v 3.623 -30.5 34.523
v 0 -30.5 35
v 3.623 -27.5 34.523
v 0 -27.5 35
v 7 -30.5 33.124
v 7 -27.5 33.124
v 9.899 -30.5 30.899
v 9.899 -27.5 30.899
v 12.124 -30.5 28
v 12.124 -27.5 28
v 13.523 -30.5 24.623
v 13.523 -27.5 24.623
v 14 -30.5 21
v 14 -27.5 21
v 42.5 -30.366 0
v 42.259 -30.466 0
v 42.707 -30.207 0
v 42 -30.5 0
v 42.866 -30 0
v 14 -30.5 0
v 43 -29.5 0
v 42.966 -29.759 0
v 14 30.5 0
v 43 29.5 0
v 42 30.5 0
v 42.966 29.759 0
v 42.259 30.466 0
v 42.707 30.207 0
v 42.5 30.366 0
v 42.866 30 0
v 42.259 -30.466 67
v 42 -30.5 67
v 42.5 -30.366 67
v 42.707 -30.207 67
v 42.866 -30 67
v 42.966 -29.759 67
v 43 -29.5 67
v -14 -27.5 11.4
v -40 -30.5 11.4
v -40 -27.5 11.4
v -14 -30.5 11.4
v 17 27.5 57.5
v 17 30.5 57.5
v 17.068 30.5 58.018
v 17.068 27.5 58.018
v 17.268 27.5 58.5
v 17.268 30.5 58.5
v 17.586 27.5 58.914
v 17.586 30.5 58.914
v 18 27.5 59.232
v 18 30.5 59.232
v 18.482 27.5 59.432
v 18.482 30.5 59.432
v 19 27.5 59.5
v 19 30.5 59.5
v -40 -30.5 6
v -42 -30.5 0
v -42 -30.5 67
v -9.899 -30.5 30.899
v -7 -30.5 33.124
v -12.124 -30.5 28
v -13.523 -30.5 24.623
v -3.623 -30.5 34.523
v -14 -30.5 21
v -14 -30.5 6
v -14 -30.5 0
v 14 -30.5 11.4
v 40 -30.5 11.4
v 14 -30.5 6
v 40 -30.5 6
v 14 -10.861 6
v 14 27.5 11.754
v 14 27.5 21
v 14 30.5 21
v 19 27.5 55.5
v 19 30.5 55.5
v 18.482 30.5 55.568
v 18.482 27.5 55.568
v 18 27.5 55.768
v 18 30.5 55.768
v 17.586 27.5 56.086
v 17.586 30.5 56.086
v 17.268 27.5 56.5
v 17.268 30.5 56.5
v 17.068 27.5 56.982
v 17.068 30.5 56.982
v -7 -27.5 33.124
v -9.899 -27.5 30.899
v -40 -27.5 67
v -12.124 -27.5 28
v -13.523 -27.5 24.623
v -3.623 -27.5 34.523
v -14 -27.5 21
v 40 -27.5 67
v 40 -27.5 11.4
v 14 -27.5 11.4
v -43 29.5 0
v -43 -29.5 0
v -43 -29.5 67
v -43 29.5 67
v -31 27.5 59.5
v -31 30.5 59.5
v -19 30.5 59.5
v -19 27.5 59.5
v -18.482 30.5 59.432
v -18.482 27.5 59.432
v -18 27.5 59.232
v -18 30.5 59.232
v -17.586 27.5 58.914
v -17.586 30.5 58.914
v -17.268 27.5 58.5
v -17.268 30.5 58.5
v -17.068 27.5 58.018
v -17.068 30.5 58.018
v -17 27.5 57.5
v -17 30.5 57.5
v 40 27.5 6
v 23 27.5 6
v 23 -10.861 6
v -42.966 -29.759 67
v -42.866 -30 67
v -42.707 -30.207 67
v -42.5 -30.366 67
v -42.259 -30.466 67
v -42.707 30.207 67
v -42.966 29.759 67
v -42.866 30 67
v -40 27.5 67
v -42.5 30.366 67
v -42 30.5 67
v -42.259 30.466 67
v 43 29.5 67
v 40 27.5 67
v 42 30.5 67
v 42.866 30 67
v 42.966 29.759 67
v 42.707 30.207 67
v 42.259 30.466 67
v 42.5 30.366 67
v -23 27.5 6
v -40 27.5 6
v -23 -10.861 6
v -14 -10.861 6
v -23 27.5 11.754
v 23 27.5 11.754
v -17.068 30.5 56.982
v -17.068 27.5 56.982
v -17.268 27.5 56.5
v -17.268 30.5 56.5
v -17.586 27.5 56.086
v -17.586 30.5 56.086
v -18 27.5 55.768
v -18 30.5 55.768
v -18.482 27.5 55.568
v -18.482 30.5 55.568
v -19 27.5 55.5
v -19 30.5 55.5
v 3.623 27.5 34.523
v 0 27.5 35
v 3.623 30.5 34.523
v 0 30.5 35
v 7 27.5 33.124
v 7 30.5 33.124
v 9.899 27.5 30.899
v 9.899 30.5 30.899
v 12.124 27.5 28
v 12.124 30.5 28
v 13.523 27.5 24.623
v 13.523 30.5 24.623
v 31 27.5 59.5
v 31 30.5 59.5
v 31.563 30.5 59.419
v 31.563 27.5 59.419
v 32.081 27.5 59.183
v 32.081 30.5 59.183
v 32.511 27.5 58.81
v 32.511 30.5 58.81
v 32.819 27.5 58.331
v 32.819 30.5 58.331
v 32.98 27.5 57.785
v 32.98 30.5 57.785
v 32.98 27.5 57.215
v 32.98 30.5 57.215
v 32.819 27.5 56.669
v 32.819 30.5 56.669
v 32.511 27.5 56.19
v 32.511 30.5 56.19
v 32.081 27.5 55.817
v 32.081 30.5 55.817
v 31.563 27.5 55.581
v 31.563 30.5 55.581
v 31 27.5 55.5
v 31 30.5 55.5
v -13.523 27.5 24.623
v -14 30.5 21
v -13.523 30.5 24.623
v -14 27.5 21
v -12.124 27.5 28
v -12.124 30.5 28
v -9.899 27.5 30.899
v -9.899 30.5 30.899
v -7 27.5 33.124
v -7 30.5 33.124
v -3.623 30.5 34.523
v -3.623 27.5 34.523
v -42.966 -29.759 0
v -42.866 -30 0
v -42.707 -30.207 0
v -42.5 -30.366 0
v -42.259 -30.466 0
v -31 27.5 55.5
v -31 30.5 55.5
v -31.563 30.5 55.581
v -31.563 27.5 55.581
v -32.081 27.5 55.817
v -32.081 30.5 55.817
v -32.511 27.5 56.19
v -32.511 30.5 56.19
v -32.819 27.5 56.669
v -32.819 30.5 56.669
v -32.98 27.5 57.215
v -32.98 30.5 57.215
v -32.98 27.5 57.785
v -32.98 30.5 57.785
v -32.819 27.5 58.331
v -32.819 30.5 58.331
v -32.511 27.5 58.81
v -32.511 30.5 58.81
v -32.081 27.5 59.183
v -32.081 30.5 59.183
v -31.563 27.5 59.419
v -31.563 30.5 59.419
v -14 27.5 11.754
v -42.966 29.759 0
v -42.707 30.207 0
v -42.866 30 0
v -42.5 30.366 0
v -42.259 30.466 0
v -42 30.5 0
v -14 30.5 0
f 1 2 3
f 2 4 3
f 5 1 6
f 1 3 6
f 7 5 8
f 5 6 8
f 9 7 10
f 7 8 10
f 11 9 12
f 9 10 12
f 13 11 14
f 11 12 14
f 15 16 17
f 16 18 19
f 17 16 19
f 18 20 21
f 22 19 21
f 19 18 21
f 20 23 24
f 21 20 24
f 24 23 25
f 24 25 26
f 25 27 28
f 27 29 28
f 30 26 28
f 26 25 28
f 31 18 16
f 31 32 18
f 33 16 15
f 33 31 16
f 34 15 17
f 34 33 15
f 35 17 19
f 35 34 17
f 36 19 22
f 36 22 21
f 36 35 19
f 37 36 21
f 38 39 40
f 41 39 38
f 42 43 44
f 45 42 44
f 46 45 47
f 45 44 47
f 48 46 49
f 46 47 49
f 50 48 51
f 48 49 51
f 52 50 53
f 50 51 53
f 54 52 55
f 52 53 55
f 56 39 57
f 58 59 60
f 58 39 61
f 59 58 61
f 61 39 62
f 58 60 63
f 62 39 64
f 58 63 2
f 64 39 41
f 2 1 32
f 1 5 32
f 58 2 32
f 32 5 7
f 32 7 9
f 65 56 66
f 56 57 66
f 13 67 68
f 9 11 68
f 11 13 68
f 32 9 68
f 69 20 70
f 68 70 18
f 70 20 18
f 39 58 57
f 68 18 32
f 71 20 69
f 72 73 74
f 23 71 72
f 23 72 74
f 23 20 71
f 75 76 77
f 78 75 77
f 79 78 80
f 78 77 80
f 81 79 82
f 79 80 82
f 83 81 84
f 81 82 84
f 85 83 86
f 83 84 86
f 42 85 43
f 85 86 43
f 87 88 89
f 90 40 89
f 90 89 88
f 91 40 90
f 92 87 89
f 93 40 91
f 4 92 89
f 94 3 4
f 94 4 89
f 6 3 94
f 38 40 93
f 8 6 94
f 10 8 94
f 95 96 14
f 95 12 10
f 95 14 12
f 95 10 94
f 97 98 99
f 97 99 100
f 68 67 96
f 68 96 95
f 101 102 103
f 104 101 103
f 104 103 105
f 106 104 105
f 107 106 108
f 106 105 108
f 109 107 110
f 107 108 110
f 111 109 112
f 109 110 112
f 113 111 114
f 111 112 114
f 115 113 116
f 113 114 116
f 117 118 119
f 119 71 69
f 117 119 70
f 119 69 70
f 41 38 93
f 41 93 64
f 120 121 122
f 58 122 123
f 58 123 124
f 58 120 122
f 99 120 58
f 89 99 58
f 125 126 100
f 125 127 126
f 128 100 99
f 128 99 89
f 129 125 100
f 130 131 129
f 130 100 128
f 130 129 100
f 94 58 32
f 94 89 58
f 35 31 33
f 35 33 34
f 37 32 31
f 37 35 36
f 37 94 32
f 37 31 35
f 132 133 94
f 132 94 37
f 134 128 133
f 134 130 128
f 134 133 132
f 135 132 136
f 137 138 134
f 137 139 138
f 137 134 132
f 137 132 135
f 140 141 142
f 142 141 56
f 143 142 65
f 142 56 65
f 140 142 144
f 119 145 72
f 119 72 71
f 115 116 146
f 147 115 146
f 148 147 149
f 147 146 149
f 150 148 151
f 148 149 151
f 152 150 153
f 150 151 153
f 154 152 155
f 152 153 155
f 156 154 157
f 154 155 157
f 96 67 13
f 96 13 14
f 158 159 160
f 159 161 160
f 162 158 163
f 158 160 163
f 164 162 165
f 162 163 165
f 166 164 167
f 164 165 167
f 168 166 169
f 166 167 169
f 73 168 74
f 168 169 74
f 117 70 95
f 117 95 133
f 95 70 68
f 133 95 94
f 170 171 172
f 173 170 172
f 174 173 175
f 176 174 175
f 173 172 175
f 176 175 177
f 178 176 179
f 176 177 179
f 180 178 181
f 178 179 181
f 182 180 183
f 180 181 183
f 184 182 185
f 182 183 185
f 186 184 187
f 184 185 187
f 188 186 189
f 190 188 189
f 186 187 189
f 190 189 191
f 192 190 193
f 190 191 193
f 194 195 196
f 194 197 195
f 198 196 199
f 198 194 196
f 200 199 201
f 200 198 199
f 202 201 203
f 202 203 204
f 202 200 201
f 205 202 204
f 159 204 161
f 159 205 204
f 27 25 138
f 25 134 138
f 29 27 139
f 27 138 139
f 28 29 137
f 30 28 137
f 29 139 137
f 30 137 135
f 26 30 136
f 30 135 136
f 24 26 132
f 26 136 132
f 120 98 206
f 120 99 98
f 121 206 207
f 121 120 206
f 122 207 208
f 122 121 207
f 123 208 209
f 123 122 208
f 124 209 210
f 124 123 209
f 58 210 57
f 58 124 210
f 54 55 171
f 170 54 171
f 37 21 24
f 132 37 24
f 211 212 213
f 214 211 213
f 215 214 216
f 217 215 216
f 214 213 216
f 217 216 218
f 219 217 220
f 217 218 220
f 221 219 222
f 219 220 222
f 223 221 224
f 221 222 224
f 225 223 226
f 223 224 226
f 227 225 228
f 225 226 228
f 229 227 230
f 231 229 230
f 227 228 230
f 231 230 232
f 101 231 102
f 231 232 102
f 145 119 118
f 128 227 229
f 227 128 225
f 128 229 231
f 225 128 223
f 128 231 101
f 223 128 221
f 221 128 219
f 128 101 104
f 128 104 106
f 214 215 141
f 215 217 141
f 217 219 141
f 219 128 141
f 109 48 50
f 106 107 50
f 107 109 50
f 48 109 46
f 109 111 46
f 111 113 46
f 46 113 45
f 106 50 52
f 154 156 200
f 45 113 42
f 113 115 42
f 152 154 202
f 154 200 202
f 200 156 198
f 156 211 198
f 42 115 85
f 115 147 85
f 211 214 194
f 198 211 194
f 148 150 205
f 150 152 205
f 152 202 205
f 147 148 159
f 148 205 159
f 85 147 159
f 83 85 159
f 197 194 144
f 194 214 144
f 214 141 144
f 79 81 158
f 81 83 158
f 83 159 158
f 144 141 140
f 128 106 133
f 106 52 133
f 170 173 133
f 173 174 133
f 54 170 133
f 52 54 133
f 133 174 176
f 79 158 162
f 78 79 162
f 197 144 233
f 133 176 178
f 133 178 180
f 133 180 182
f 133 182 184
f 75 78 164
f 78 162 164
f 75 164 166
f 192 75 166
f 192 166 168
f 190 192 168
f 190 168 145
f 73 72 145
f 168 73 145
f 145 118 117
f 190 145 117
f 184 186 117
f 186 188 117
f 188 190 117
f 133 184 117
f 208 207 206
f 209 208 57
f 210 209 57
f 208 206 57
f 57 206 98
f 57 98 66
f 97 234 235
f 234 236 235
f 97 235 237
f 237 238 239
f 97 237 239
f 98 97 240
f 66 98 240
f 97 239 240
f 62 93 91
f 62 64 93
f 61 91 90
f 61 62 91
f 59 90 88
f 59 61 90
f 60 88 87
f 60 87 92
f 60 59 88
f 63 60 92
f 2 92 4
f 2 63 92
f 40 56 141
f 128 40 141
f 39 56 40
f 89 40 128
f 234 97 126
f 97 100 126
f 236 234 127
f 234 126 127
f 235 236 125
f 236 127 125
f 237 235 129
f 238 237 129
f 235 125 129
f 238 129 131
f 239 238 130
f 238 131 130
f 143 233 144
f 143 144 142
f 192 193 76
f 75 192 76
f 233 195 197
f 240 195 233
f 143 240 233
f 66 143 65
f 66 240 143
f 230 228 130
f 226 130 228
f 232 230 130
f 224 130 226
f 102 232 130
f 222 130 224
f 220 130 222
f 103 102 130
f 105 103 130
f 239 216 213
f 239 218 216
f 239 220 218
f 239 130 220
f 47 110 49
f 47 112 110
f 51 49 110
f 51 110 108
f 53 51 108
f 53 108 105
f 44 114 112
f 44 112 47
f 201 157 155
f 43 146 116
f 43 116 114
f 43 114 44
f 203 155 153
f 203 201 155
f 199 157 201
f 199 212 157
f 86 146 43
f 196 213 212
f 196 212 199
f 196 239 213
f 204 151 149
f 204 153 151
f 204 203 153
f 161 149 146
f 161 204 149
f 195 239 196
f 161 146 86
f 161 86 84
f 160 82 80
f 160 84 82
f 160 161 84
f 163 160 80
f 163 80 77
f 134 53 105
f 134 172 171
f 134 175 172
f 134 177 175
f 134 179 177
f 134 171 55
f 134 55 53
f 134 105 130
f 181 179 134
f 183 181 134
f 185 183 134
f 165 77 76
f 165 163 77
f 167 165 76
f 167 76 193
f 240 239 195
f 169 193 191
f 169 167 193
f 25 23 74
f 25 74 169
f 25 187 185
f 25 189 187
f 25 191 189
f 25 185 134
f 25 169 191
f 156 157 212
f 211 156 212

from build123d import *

# Parameters (mm, degrees)
F0_W      = 86
F0_H      = 61
F0_W_2    = 80
F0_H_2    = 55
F1_DEPTH  = 67
F2_DEPTH  = 6
F3_W      = 80
F3_H      = 5.4
F4_DEPTH  = 3
F6_W      = 28
F6_H      = 3
F6_H_2    = 55
F7_DEPTH  = 35
F8_R      = 13.99999
F9_DEPTH  = 23
F10_W     = 28
F10_H     = 29.4785189629
F11_DEPTH = 25
F12_W     = 6
F12_H     = 2
F13_DEPTH = 6
F14_R     = 1


# Not quite as in the source:
# - a fillet or chamfer is up to 0.001 mm smaller than in the source, because OpenCascade refuses the exact size


with BuildPart() as f1:
    # F0 (on Top) → F1 (new body)
    with BuildSketch(Plane.XY):
        Rectangle(F0_W, F0_H)
        Rectangle(F0_W_2, F0_H_2, mode=Mode.SUBTRACT)
    extrude(amount=F1_DEPTH)

    # F0 (on Top) → F2 (join)
    with BuildSketch(Plane.XY):
        Rectangle(F0_W_2, F0_H_2)
    extrude(amount=F2_DEPTH)

    # F3 (on face) → F4 (cut)
    with BuildSketch(Plane.XZ.offset(30.5)):
        with Locations((0, 8.7)):
            Rectangle(F3_W, F3_H)
    extrude(amount=-F4_DEPTH, mode=Mode.SUBTRACT)

    # F6 (on face) → F7 (cut)
    with BuildSketch(Plane.XY):
        with Locations((0, -29)):
            Rectangle(F6_W, F6_H)
        Rectangle(F6_W, F6_H_2)
        with Locations((0, 29)):
            Rectangle(F6_W, F6_H)
    extrude(amount=F7_DEPTH, mode=Mode.SUBTRACT)

    # F8 (radius 14 in the source; OpenCascade refuses exactly that, so slightly less here)
    f8_edges = [f1.edges().sort_by_distance(p)[0] for p in [
        (14, -29, 35),
        (-14, -29, 35),
        (-14, 29, 35),
        (14, 29, 35),
    ]]
    fillet(f8_edges, radius=F8_R)

    # F5 (on Right) → F9 (join, symmetric)
    with BuildSketch(Plane.YZ):
        Polygon((-10.8611155301, 0), (29.1388844699, 0), (29.1388844699, 12), (-10.8611155301, 6), align=None)
    extrude(amount=F9_DEPTH, both=True)

    # F10 (on face) → F11 (cut)
    with BuildSketch(Plane(origin=(0, -1.1191932513, 7.4612883418), x_dir=(1, 0, 0), z_dir=(0, -0.1483404529, 0.9889363529))):
        Polygon((-14, -9.8509092629), (14, -9.8509092629), (14, 28.9393682094), (14, 30.5965875694), (-14, 30.5965875694), (-14, 28.9393682094), align=None)
        with Locations((0, -24.5901687443)):
            Rectangle(F10_W, F10_H)
    extrude(amount=-F11_DEPTH, mode=Mode.SUBTRACT)

    # F12 (on face) → F13 (cut)
    with BuildSketch(Plane(origin=(0, 30.5, 0), x_dir=(-1, 0, 0), z_dir=(0, 1, 0))):
        with BuildLine():
            Line((-31, 55.5), (-31, 59.5))
            ThreePointArc((-31, 59.5), (-33, 57.5), (-31, 55.5))
        make_face()
        Polygon((-25, 57.5), (-19, 57.5), (-19, 59.5), (-31, 59.5), (-31, 55.5), (-25, 55.5), align=None)
        with Locations((-22, 56.5)):
            Rectangle(F12_W, F12_H)
        with BuildLine():
            ThreePointArc((-19, 55.5), (-17.5857864376, 56.0857864376), (-17, 57.5))
            Line((-17, 57.5), (-19, 57.5))
            Line((-19, 57.5), (-19, 55.5))
        make_face()
        with BuildLine():
            Line((-19, 57.5), (-17, 57.5))
            ThreePointArc((-17, 57.5), (-17.5857864376, 58.9142135624), (-19, 59.5))
            Line((-19, 59.5), (-19, 57.5))
        make_face()
        with BuildLine():
            Line((19, 55.5), (19, 57.5))
            Line((19, 57.5), (17, 57.5))
            ThreePointArc((17, 57.5), (17.5857864376, 56.0857864376), (19, 55.5))
        make_face()
        with BuildLine():
            Line((17, 57.5), (19, 57.5))
            Line((19, 57.5), (19, 59.5))
            ThreePointArc((19, 59.5), (17.5857864376, 58.9142135624), (17, 57.5))
        make_face()
        Polygon((19, 57.5), (25, 57.5), (25, 55.5), (31, 55.5), (31, 59.5), (19, 59.5), align=None)
        with Locations((22, 56.5)):
            Rectangle(F12_W, F12_H)
        with BuildLine():
            Line((31, 59.5), (31, 55.5))
            ThreePointArc((31, 55.5), (33, 57.5), (31, 59.5))
        make_face()
    extrude(amount=-F13_DEPTH, mode=Mode.SUBTRACT)

    # F14
    f14_edges = [f1.edges().sort_by_distance(p)[0] for p in [
        (-43, -30.5, 33.5),
        (43, -30.5, 33.5),
        (43, 30.5, 33.5),
        (-43, 30.5, 33.5),
    ]]
    fillet(f14_edges, radius=F14_R)


solid = f1.part
